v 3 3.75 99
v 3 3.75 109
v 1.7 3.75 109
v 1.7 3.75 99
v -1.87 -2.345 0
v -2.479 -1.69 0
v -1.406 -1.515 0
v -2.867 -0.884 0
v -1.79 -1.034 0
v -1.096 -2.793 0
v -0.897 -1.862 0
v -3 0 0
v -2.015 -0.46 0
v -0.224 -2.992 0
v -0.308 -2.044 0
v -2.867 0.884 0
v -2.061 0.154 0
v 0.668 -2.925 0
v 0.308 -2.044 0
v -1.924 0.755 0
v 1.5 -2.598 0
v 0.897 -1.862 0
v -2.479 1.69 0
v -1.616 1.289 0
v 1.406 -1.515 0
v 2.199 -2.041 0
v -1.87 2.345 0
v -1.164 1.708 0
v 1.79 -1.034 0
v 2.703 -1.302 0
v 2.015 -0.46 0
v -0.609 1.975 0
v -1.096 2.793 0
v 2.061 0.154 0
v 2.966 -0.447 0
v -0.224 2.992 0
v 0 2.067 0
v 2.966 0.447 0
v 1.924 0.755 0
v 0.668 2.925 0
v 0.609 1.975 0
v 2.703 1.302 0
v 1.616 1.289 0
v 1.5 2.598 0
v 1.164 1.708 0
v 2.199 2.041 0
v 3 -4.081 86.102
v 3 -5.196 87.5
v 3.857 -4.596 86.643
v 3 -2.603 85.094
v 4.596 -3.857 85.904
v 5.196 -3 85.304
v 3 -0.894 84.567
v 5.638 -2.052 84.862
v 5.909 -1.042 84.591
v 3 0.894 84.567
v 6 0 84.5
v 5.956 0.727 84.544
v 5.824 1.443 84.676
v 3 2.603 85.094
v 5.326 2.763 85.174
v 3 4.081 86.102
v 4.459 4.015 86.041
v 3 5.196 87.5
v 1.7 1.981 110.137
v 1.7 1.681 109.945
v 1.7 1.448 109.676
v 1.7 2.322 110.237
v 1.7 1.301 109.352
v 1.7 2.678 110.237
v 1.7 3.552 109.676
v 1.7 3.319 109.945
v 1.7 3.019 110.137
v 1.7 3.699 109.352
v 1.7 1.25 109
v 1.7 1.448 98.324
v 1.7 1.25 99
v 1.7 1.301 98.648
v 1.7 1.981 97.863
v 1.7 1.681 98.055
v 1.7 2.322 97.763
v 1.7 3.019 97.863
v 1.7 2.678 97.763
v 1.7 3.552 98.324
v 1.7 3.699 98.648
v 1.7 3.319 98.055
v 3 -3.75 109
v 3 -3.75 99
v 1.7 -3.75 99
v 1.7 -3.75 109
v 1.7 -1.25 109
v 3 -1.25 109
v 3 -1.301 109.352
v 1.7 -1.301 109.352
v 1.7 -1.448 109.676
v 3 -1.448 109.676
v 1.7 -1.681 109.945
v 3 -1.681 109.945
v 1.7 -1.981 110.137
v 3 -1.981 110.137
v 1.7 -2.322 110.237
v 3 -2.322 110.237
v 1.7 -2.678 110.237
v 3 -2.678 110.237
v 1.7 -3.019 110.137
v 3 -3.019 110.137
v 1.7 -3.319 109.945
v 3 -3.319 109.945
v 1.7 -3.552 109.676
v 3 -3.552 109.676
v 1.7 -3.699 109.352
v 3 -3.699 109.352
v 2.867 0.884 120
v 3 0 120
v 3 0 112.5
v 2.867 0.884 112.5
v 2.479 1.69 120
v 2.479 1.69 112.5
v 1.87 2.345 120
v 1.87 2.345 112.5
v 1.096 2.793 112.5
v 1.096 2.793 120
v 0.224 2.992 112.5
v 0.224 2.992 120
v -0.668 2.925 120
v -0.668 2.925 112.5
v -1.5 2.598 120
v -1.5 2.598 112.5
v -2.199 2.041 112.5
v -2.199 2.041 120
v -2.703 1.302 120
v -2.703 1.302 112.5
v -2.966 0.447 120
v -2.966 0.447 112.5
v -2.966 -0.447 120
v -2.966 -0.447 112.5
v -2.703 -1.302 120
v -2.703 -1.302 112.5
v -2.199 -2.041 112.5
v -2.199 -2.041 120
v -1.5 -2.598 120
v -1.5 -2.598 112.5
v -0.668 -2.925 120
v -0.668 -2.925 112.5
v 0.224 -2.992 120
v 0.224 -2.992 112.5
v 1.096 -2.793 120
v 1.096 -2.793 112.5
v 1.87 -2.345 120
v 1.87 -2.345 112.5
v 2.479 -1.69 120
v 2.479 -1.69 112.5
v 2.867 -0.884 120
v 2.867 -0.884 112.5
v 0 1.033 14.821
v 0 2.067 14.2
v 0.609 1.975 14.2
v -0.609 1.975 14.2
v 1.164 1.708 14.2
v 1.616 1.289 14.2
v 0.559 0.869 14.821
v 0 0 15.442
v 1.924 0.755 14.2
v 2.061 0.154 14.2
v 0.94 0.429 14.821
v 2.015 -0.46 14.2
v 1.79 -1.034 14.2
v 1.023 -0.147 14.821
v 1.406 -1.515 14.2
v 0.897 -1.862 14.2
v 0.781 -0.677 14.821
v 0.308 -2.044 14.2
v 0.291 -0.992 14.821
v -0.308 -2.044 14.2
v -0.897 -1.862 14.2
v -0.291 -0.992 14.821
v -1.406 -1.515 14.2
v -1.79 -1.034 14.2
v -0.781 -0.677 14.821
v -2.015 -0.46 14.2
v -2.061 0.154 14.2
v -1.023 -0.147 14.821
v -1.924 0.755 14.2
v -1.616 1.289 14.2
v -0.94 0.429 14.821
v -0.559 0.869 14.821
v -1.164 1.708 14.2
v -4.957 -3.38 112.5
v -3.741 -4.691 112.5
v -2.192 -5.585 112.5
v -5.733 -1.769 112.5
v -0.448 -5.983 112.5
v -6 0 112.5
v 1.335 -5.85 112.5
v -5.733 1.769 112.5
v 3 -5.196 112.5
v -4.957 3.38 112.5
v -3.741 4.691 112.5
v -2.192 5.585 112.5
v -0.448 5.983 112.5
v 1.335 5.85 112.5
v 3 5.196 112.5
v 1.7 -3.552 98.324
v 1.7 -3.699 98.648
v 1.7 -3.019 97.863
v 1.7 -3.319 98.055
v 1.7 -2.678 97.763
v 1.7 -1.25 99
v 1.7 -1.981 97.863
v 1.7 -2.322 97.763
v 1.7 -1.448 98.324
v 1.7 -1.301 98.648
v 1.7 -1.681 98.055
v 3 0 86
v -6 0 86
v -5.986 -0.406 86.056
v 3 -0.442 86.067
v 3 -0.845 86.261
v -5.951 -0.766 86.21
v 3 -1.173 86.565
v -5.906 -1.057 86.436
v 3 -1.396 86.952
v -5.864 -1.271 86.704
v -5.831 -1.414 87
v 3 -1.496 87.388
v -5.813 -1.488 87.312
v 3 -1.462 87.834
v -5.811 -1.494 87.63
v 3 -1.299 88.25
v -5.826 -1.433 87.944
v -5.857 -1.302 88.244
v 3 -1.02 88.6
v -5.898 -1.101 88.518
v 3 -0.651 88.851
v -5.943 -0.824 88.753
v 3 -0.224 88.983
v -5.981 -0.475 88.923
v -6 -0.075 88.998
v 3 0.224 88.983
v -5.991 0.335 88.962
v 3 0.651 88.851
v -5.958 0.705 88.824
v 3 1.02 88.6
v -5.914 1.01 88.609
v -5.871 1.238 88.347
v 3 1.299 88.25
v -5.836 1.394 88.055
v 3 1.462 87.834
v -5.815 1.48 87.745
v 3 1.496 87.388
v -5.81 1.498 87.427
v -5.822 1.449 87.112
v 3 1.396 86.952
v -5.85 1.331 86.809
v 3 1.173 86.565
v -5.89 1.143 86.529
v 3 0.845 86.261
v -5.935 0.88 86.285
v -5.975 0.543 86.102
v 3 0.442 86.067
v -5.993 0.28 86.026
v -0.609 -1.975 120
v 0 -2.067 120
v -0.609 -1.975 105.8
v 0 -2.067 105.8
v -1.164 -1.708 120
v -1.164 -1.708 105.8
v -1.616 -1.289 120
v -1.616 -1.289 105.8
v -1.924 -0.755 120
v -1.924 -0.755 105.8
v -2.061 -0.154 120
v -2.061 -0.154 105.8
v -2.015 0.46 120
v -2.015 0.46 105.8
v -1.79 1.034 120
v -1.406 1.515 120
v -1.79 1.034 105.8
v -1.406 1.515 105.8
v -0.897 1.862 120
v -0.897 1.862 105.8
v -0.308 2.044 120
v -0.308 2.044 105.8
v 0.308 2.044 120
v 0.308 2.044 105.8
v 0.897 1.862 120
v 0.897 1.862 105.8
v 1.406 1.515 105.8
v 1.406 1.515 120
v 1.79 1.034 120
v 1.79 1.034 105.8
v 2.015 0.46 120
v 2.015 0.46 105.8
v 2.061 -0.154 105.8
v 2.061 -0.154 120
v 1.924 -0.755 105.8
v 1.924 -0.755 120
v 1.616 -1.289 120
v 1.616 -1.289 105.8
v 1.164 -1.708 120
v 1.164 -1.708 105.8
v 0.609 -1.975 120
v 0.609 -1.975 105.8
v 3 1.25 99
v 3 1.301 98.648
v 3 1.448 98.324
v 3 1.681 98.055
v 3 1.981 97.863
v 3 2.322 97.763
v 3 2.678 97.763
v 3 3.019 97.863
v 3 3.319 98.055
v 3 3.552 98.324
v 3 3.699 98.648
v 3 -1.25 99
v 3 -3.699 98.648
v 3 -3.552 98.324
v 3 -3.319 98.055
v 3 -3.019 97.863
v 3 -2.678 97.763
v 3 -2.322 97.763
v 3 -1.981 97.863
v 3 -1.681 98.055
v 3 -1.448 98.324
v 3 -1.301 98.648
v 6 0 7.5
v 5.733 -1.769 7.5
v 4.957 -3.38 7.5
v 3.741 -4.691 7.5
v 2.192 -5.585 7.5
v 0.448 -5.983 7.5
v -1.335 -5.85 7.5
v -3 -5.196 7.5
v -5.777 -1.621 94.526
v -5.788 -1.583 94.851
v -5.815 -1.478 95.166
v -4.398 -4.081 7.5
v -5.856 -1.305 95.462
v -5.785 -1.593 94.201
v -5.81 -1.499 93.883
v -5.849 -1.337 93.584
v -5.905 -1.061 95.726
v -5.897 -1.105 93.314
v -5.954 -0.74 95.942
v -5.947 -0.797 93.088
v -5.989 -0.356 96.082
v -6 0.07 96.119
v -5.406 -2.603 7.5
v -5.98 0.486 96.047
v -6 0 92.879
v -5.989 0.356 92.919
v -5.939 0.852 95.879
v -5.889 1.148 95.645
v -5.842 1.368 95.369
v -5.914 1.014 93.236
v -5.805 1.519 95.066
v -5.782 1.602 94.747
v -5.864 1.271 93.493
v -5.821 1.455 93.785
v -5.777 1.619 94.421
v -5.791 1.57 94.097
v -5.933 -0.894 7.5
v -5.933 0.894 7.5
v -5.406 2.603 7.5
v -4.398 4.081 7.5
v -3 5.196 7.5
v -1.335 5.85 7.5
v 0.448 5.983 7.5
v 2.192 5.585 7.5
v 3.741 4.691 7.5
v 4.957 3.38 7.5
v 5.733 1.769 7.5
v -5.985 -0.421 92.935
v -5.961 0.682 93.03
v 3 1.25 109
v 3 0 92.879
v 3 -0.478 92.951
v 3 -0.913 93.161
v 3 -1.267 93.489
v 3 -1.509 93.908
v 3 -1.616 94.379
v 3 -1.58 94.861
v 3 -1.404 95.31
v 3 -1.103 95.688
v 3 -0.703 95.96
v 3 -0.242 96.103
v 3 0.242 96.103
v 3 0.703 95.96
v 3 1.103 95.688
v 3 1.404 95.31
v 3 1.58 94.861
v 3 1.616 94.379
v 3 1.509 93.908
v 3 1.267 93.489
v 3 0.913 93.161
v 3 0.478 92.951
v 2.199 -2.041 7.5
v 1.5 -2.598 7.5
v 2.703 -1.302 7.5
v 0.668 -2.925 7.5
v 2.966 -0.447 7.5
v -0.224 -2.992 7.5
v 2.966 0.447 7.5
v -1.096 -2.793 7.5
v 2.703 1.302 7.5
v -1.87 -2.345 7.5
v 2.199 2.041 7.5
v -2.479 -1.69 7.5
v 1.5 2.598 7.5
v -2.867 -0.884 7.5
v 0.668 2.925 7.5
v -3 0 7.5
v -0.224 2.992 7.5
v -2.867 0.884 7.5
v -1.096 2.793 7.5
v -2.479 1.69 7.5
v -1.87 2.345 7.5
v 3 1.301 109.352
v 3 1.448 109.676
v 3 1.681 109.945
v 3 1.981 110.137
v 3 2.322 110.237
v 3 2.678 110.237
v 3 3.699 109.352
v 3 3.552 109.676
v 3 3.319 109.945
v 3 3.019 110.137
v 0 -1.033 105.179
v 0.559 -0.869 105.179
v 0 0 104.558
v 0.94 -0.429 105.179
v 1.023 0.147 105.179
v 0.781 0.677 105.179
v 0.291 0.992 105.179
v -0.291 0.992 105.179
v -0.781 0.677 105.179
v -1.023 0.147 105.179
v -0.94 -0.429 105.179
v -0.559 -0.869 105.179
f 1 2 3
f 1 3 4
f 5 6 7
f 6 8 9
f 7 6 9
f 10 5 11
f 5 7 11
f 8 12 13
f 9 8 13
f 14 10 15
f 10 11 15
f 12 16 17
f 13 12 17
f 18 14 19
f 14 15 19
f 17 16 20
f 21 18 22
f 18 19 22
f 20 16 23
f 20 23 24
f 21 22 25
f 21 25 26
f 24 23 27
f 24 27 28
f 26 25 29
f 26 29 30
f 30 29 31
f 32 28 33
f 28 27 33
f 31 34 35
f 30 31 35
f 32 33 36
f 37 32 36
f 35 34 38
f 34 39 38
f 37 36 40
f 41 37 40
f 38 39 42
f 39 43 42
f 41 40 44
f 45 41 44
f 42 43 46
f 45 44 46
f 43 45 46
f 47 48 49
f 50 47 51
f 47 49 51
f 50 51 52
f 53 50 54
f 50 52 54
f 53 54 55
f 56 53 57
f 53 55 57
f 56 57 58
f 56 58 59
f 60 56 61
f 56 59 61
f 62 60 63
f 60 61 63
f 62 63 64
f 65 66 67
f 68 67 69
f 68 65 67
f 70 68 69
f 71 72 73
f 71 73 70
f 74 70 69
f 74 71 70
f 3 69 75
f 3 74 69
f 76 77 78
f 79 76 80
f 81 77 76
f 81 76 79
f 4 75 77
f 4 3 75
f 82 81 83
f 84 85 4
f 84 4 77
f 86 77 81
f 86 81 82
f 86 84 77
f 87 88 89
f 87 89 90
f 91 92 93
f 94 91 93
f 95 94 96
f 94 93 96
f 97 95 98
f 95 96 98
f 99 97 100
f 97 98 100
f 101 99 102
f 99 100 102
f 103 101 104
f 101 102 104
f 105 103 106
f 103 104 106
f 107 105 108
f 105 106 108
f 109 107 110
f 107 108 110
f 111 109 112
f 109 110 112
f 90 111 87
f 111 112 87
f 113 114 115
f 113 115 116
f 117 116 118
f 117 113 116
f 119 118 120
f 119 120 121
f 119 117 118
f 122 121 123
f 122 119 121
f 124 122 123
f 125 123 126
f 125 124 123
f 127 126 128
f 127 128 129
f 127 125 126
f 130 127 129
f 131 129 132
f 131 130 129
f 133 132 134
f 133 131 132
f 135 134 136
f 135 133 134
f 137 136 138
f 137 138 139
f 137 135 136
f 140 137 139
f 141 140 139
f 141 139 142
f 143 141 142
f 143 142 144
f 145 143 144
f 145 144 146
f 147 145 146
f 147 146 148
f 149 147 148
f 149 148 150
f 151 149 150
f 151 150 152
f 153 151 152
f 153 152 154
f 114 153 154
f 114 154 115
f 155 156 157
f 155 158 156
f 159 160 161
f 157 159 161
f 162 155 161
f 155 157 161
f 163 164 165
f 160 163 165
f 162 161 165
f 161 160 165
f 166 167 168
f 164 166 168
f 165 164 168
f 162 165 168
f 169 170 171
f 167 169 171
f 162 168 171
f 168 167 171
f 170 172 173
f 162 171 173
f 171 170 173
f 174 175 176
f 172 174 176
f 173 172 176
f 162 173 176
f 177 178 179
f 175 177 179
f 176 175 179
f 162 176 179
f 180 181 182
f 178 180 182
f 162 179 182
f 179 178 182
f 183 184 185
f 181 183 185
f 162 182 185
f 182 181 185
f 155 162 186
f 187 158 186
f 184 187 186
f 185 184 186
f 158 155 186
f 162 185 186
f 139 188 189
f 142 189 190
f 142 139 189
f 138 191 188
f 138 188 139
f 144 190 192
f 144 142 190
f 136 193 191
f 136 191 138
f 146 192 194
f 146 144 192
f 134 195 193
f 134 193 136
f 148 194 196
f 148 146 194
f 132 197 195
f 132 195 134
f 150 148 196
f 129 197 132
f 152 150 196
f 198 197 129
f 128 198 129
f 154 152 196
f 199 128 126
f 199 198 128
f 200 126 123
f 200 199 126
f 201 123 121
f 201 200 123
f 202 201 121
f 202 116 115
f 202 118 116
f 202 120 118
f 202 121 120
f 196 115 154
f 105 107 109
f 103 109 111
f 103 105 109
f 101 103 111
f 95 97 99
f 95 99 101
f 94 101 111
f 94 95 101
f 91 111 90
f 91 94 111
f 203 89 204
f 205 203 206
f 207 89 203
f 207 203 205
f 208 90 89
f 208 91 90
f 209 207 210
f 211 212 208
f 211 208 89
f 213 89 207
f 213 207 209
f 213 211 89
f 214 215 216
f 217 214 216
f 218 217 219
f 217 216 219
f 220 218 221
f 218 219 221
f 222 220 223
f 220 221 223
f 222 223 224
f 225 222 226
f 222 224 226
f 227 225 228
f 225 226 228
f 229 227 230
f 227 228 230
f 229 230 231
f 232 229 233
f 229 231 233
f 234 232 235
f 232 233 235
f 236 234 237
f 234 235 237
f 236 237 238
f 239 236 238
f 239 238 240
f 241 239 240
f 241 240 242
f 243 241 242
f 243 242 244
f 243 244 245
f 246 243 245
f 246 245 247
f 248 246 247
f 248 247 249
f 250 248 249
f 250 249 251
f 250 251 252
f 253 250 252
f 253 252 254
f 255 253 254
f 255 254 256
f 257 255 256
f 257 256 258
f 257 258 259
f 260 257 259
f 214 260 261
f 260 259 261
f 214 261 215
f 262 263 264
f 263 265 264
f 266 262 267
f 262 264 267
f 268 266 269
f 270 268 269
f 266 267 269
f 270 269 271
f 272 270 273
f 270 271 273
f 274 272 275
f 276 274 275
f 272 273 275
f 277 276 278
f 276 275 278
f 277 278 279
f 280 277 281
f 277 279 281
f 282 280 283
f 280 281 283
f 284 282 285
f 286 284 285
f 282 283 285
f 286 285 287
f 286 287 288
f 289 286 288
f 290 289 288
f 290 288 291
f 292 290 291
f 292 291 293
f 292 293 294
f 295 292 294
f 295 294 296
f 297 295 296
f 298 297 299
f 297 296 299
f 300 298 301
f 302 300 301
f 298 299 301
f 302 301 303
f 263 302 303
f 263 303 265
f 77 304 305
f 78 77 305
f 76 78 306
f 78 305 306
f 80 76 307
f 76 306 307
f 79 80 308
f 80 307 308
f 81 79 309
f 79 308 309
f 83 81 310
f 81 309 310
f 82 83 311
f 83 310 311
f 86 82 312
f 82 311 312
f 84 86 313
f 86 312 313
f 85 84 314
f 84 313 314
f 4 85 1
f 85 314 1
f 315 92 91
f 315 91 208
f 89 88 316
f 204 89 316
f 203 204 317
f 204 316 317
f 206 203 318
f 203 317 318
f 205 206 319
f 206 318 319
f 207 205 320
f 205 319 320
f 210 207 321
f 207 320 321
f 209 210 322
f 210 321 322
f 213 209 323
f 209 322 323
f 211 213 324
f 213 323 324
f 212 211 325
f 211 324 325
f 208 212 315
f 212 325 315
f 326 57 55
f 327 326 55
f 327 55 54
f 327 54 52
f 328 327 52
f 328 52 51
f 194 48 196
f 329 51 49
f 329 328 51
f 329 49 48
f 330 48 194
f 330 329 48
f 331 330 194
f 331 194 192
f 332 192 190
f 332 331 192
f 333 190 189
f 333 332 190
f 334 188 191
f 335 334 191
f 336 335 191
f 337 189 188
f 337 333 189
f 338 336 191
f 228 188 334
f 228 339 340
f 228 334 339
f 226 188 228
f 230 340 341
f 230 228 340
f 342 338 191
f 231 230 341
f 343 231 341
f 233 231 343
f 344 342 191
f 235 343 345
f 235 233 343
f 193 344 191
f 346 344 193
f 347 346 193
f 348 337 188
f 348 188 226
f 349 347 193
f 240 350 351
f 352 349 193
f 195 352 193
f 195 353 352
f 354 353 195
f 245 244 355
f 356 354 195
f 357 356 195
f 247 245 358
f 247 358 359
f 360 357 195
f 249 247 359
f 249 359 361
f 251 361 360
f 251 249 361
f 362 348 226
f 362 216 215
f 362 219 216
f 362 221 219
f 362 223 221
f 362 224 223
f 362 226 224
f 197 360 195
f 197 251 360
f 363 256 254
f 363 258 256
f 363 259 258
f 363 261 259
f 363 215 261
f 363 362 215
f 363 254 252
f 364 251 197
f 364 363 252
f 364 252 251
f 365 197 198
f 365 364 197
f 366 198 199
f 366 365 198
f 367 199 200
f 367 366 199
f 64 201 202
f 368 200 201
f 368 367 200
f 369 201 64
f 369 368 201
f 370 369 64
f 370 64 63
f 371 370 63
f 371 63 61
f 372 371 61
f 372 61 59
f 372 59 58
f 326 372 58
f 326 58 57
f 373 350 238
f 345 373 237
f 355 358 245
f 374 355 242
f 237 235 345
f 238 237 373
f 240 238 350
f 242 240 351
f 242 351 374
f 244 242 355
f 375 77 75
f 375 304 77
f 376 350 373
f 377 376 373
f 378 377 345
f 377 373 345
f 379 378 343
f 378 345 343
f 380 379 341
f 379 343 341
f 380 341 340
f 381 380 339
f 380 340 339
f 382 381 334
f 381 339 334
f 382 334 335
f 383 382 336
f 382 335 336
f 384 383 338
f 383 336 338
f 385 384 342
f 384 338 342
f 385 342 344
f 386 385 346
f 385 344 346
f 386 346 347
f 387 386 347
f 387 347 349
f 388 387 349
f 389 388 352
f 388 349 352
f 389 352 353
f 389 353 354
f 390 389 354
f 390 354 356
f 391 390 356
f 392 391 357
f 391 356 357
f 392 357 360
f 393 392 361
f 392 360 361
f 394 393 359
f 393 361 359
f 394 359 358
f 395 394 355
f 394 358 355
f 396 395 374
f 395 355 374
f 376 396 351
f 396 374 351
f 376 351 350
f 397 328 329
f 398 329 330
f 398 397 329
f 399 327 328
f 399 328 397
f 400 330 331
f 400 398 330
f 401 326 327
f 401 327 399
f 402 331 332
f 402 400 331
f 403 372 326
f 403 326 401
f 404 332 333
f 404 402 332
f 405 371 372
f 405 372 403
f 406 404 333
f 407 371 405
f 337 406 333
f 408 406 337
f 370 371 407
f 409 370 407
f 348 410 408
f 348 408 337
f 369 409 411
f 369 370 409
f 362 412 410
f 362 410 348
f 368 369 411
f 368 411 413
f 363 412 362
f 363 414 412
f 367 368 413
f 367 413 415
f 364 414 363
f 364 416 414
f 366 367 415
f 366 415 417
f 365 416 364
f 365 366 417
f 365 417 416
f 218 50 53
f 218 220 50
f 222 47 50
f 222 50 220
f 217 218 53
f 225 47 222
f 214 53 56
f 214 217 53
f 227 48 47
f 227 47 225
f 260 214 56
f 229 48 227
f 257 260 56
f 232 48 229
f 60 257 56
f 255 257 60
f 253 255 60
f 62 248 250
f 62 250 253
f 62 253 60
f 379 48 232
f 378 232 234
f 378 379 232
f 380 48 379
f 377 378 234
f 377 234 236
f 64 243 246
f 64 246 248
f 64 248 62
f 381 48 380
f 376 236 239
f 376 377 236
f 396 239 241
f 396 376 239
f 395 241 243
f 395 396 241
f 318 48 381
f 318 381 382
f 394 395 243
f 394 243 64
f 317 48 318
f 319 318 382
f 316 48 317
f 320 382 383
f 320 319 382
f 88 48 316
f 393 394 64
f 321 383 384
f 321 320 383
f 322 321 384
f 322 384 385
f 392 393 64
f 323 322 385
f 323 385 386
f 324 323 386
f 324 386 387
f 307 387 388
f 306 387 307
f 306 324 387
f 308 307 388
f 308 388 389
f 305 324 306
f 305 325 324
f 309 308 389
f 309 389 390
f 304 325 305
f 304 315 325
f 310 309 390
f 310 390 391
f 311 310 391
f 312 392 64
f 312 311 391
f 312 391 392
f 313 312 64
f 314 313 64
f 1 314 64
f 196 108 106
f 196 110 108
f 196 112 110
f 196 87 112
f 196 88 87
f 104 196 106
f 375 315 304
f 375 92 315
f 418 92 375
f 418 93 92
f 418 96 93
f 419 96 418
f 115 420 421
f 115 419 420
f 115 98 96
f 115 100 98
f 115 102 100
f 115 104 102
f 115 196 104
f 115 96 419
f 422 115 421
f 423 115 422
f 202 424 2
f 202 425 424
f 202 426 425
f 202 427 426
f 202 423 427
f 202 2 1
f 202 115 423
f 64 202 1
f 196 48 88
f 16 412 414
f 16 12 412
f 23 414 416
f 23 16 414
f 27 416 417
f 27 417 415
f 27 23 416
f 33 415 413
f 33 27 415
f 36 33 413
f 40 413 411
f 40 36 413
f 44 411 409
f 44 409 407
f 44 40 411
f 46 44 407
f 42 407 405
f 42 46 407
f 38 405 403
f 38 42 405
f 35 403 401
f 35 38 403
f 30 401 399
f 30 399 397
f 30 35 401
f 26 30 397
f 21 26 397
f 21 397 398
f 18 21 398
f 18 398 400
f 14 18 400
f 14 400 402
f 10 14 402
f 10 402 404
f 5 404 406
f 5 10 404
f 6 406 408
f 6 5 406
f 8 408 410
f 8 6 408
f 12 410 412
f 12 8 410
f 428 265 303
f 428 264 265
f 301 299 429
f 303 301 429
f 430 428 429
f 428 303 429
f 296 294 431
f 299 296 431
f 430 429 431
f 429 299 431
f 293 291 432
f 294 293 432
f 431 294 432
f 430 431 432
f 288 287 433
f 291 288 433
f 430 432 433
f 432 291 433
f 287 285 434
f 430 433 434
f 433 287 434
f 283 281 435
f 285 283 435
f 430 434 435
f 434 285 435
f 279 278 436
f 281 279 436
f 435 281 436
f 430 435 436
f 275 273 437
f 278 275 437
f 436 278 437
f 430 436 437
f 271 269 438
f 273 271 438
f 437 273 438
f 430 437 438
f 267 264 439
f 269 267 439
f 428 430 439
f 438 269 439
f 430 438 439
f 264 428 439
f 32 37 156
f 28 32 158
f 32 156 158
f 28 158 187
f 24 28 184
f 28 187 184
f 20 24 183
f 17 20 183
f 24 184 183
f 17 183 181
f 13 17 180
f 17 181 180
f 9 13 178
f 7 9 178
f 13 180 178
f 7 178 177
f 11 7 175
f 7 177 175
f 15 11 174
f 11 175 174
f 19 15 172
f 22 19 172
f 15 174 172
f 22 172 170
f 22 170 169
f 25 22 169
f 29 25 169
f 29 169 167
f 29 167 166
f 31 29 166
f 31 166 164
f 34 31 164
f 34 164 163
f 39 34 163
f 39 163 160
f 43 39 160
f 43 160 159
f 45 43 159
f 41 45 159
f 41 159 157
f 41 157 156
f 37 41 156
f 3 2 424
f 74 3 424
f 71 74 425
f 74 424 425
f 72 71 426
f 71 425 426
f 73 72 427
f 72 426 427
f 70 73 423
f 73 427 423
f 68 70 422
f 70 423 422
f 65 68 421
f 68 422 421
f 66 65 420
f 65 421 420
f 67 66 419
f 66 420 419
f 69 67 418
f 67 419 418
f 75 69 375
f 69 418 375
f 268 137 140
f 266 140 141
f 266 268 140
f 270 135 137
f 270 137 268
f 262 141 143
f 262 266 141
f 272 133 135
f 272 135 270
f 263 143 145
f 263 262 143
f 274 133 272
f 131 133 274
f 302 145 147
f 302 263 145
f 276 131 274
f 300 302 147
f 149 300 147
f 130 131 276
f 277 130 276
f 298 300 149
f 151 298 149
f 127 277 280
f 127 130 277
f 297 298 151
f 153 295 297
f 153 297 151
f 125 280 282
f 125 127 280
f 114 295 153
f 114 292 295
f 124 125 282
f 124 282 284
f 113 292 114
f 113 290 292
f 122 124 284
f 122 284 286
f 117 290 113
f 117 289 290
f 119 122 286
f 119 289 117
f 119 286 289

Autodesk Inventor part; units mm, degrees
ref_plane "XZ Plane" through (0, 0, 0) normal (0, 1, 0) x (-1, 0, 0)
ref_plane "XY Plane" through (0, 0, 0) normal (0, 0, 1) x (1, 0, 0)
sketch "Skizze1" plane through (0, 0, 0) normal (0, 0, 1) x (1, 0, 0)
  line L0 (-8.4, 0) -> (8.4, 0) projected
  line L1 (0, -8.4) -> (0, 8.4) projected
  circle A0 centre (0, 0) radius 6
  dimension "d0" = 12
extrude "Extrusion1" add sketch "Skizze1" along normal blind 120
sketch "Skizze2" plane through (0, 0, 120) normal (0, 0, 1) x (1, 0, 0)
  circle A0 centre (0, 0) radius 6 projected
  circle A1 centre (0, 0) radius 3
  dimension "d3" = 6
extrude "Extrusion2" cut sketch "Skizze2" against normal blind 7.5
sketch "Skizze3" plane through (0, 0, 0) normal (0, 0, -1) x (-1, 0, 0)
  circle A0 centre (0, 0) radius 6 projected
  circle A1 centre (0, 0) radius 3
  circle A2 centre (0, 0) radius 3 projected
extrude "Extrusion3" cut sketch "Skizze3" against normal blind 7.5
sketch "Skizze4" plane through (0, 0, 0) normal (0, 0, -1) x (-1, 0, 0)
  circle A0 centre (0, 0) radius 3 projected
hole "Bohrung1" at (0, 0, 0) direction (0, 0, 1) diameter 4.134 depth 14.2 tip angle 118 thread size "M5x0.8" class "6H" standard "ISO Metric profile"
sketch "Skizze5" plane through (0, 0, 120) normal (0, 0, 1) x (1, 0, 0)
  point P0 (0, 0)
  point P1 (0, 0)
hole "Bohrung2" at (0, 0, 120) direction (0, 0, -1) diameter 4.134 depth 14.2 tip angle 118 thread size "M5x0.8" class "6H" standard "ISO Metric profile"
ref_plane "Arbeitsebene1" through (6, 0, 0) normal (1, 0, 0) x (0, 1, 0)
sketch "Skizze7" plane through (6, 0, 0) normal (1, 0, 0) x (0, 1, 0)
  line L0 (-6, 112.5) -> (6, 112.5) projected
  line L1 (-6, 7.5) -> (-6, 112.5) projected
  line L2 (6, 7.5) -> (6, 112.5) projected
  line L3 (-6, 112.5) -> (6, 112.5)
  line L4 (6, 112.5) -> (6, 90.5)
  line L5 (6, 90.5) -> (-6, 90.5)
  line L6 (-6, 90.5) -> (-6, 112.5)
  arc A0 (-6, 90.5) -> (6, 90.5) centre (0, 90.5) ccw
  line L7 (-8.4, 0) -> (8.4, 0) projected
  line L8 (0, -24) -> (0, 144) projected
  point P0 (0, 0)
  dimension "d22" = 22
extrude "Extrusion4" cut sketch "Skizze7" against normal blind 3
sketch "Skizze8" plane through (3, 0, 0) normal (1, 0, 0) x (0, 0, -1)
  line L0 (0, -8.4) -> (0, 8.4) projected
  line L1 (24, 0) -> (-144, 0) projected
  line L2 (-109, -2.5) -> (-99, -2.5) construction
  line L3 (-87.5, -5.1962) -> (-112.5, -5.1962) projected
  line L4 (-99, 2.5) -> (-109, 2.5) construction
  line L5 (-109, -2.5) -> (-99, -2.5) construction
  line L6 (-109, -1.25) -> (-99, -1.25)
  line L7 (-99, -3.75) -> (-109, -3.75)
  arc A0 (-109, -1.25) -> (-109, -3.75) centre (-109, -2.5) ccw
  arc A1 (-99, -3.75) -> (-99, -1.25) centre (-99, -2.5) ccw
  line L8 (-109, 2.5) -> (-99, 2.5) construction
  line L9 (-109, 3.75) -> (-99, 3.75)
  line L10 (-99, 1.25) -> (-109, 1.25)
  arc A2 (-109, 3.75) -> (-109, 1.25) centre (-109, 2.5) ccw
  arc A3 (-99, 1.25) -> (-99, 3.75) centre (-99, 2.5) ccw
  line L11 (-112.5, 0) -> (-112.5, 5.1962) projected
  line L12 (-112.5, -5.1962) -> (-112.5, 0) projected
  point P0 (0, 0)
  point P1 (-104, -2.5)
  point P2 (-104, 2.5)
  dimension "d25" = 5
  dimension "d26" = 2.5
  dimension "d27" = 2.5
  dimension "d28" = 3.5
  dimension "d29" = 3.5
  dimension "d30" = 10
  dimension "d31" = 10
extrude "Extrusion5" cut sketch "Skizze8" against normal blind 1.3
sketch "Skizze9" plane through (3, 0, 0) normal (1, 0, 0) x (0, 0, -1)
  line L0 (24, 0) -> (-144, 0) projected
  line L1 (0, -8.4) -> (0, 8.4) projected
  line L2 (-112.5, -5.1962) -> (-112.5, 0) projected
  point P0 (0, 0)
  point P1 (-94.5, 0)
  dimension "d34" = 18
hole "Bohrung3" at (3, 0, 94.5) direction (-1, 0, 0) diameter 3.242 depth 11.8 tip angle 118 thread size "M4x0.7" class "6H" standard "ISO Metric profile"
sketch "Skizze10" plane through (3, 0, 0) normal (1, 0, 0) x (0, 0, -1)
  line L0 (24, 0) -> (-144, 0) projected
  line L1 (0, -8.4) -> (0, 8.4) projected
  circle A0 centre (-94.5, 0) radius 1.621 projected
  point P0 (0, 0)
  point P1 (-87.5, 0)
  dimension "d42" = 7
hole "Bohrung4" at (3, 0, 87.5) direction (-1, 0, 0) diameter 3 end through all
equation "\"d27\" = d26"
equation "\"d29\" = d28"
equation "\"d31\" = d30"
properties part number "24_0497_004"
